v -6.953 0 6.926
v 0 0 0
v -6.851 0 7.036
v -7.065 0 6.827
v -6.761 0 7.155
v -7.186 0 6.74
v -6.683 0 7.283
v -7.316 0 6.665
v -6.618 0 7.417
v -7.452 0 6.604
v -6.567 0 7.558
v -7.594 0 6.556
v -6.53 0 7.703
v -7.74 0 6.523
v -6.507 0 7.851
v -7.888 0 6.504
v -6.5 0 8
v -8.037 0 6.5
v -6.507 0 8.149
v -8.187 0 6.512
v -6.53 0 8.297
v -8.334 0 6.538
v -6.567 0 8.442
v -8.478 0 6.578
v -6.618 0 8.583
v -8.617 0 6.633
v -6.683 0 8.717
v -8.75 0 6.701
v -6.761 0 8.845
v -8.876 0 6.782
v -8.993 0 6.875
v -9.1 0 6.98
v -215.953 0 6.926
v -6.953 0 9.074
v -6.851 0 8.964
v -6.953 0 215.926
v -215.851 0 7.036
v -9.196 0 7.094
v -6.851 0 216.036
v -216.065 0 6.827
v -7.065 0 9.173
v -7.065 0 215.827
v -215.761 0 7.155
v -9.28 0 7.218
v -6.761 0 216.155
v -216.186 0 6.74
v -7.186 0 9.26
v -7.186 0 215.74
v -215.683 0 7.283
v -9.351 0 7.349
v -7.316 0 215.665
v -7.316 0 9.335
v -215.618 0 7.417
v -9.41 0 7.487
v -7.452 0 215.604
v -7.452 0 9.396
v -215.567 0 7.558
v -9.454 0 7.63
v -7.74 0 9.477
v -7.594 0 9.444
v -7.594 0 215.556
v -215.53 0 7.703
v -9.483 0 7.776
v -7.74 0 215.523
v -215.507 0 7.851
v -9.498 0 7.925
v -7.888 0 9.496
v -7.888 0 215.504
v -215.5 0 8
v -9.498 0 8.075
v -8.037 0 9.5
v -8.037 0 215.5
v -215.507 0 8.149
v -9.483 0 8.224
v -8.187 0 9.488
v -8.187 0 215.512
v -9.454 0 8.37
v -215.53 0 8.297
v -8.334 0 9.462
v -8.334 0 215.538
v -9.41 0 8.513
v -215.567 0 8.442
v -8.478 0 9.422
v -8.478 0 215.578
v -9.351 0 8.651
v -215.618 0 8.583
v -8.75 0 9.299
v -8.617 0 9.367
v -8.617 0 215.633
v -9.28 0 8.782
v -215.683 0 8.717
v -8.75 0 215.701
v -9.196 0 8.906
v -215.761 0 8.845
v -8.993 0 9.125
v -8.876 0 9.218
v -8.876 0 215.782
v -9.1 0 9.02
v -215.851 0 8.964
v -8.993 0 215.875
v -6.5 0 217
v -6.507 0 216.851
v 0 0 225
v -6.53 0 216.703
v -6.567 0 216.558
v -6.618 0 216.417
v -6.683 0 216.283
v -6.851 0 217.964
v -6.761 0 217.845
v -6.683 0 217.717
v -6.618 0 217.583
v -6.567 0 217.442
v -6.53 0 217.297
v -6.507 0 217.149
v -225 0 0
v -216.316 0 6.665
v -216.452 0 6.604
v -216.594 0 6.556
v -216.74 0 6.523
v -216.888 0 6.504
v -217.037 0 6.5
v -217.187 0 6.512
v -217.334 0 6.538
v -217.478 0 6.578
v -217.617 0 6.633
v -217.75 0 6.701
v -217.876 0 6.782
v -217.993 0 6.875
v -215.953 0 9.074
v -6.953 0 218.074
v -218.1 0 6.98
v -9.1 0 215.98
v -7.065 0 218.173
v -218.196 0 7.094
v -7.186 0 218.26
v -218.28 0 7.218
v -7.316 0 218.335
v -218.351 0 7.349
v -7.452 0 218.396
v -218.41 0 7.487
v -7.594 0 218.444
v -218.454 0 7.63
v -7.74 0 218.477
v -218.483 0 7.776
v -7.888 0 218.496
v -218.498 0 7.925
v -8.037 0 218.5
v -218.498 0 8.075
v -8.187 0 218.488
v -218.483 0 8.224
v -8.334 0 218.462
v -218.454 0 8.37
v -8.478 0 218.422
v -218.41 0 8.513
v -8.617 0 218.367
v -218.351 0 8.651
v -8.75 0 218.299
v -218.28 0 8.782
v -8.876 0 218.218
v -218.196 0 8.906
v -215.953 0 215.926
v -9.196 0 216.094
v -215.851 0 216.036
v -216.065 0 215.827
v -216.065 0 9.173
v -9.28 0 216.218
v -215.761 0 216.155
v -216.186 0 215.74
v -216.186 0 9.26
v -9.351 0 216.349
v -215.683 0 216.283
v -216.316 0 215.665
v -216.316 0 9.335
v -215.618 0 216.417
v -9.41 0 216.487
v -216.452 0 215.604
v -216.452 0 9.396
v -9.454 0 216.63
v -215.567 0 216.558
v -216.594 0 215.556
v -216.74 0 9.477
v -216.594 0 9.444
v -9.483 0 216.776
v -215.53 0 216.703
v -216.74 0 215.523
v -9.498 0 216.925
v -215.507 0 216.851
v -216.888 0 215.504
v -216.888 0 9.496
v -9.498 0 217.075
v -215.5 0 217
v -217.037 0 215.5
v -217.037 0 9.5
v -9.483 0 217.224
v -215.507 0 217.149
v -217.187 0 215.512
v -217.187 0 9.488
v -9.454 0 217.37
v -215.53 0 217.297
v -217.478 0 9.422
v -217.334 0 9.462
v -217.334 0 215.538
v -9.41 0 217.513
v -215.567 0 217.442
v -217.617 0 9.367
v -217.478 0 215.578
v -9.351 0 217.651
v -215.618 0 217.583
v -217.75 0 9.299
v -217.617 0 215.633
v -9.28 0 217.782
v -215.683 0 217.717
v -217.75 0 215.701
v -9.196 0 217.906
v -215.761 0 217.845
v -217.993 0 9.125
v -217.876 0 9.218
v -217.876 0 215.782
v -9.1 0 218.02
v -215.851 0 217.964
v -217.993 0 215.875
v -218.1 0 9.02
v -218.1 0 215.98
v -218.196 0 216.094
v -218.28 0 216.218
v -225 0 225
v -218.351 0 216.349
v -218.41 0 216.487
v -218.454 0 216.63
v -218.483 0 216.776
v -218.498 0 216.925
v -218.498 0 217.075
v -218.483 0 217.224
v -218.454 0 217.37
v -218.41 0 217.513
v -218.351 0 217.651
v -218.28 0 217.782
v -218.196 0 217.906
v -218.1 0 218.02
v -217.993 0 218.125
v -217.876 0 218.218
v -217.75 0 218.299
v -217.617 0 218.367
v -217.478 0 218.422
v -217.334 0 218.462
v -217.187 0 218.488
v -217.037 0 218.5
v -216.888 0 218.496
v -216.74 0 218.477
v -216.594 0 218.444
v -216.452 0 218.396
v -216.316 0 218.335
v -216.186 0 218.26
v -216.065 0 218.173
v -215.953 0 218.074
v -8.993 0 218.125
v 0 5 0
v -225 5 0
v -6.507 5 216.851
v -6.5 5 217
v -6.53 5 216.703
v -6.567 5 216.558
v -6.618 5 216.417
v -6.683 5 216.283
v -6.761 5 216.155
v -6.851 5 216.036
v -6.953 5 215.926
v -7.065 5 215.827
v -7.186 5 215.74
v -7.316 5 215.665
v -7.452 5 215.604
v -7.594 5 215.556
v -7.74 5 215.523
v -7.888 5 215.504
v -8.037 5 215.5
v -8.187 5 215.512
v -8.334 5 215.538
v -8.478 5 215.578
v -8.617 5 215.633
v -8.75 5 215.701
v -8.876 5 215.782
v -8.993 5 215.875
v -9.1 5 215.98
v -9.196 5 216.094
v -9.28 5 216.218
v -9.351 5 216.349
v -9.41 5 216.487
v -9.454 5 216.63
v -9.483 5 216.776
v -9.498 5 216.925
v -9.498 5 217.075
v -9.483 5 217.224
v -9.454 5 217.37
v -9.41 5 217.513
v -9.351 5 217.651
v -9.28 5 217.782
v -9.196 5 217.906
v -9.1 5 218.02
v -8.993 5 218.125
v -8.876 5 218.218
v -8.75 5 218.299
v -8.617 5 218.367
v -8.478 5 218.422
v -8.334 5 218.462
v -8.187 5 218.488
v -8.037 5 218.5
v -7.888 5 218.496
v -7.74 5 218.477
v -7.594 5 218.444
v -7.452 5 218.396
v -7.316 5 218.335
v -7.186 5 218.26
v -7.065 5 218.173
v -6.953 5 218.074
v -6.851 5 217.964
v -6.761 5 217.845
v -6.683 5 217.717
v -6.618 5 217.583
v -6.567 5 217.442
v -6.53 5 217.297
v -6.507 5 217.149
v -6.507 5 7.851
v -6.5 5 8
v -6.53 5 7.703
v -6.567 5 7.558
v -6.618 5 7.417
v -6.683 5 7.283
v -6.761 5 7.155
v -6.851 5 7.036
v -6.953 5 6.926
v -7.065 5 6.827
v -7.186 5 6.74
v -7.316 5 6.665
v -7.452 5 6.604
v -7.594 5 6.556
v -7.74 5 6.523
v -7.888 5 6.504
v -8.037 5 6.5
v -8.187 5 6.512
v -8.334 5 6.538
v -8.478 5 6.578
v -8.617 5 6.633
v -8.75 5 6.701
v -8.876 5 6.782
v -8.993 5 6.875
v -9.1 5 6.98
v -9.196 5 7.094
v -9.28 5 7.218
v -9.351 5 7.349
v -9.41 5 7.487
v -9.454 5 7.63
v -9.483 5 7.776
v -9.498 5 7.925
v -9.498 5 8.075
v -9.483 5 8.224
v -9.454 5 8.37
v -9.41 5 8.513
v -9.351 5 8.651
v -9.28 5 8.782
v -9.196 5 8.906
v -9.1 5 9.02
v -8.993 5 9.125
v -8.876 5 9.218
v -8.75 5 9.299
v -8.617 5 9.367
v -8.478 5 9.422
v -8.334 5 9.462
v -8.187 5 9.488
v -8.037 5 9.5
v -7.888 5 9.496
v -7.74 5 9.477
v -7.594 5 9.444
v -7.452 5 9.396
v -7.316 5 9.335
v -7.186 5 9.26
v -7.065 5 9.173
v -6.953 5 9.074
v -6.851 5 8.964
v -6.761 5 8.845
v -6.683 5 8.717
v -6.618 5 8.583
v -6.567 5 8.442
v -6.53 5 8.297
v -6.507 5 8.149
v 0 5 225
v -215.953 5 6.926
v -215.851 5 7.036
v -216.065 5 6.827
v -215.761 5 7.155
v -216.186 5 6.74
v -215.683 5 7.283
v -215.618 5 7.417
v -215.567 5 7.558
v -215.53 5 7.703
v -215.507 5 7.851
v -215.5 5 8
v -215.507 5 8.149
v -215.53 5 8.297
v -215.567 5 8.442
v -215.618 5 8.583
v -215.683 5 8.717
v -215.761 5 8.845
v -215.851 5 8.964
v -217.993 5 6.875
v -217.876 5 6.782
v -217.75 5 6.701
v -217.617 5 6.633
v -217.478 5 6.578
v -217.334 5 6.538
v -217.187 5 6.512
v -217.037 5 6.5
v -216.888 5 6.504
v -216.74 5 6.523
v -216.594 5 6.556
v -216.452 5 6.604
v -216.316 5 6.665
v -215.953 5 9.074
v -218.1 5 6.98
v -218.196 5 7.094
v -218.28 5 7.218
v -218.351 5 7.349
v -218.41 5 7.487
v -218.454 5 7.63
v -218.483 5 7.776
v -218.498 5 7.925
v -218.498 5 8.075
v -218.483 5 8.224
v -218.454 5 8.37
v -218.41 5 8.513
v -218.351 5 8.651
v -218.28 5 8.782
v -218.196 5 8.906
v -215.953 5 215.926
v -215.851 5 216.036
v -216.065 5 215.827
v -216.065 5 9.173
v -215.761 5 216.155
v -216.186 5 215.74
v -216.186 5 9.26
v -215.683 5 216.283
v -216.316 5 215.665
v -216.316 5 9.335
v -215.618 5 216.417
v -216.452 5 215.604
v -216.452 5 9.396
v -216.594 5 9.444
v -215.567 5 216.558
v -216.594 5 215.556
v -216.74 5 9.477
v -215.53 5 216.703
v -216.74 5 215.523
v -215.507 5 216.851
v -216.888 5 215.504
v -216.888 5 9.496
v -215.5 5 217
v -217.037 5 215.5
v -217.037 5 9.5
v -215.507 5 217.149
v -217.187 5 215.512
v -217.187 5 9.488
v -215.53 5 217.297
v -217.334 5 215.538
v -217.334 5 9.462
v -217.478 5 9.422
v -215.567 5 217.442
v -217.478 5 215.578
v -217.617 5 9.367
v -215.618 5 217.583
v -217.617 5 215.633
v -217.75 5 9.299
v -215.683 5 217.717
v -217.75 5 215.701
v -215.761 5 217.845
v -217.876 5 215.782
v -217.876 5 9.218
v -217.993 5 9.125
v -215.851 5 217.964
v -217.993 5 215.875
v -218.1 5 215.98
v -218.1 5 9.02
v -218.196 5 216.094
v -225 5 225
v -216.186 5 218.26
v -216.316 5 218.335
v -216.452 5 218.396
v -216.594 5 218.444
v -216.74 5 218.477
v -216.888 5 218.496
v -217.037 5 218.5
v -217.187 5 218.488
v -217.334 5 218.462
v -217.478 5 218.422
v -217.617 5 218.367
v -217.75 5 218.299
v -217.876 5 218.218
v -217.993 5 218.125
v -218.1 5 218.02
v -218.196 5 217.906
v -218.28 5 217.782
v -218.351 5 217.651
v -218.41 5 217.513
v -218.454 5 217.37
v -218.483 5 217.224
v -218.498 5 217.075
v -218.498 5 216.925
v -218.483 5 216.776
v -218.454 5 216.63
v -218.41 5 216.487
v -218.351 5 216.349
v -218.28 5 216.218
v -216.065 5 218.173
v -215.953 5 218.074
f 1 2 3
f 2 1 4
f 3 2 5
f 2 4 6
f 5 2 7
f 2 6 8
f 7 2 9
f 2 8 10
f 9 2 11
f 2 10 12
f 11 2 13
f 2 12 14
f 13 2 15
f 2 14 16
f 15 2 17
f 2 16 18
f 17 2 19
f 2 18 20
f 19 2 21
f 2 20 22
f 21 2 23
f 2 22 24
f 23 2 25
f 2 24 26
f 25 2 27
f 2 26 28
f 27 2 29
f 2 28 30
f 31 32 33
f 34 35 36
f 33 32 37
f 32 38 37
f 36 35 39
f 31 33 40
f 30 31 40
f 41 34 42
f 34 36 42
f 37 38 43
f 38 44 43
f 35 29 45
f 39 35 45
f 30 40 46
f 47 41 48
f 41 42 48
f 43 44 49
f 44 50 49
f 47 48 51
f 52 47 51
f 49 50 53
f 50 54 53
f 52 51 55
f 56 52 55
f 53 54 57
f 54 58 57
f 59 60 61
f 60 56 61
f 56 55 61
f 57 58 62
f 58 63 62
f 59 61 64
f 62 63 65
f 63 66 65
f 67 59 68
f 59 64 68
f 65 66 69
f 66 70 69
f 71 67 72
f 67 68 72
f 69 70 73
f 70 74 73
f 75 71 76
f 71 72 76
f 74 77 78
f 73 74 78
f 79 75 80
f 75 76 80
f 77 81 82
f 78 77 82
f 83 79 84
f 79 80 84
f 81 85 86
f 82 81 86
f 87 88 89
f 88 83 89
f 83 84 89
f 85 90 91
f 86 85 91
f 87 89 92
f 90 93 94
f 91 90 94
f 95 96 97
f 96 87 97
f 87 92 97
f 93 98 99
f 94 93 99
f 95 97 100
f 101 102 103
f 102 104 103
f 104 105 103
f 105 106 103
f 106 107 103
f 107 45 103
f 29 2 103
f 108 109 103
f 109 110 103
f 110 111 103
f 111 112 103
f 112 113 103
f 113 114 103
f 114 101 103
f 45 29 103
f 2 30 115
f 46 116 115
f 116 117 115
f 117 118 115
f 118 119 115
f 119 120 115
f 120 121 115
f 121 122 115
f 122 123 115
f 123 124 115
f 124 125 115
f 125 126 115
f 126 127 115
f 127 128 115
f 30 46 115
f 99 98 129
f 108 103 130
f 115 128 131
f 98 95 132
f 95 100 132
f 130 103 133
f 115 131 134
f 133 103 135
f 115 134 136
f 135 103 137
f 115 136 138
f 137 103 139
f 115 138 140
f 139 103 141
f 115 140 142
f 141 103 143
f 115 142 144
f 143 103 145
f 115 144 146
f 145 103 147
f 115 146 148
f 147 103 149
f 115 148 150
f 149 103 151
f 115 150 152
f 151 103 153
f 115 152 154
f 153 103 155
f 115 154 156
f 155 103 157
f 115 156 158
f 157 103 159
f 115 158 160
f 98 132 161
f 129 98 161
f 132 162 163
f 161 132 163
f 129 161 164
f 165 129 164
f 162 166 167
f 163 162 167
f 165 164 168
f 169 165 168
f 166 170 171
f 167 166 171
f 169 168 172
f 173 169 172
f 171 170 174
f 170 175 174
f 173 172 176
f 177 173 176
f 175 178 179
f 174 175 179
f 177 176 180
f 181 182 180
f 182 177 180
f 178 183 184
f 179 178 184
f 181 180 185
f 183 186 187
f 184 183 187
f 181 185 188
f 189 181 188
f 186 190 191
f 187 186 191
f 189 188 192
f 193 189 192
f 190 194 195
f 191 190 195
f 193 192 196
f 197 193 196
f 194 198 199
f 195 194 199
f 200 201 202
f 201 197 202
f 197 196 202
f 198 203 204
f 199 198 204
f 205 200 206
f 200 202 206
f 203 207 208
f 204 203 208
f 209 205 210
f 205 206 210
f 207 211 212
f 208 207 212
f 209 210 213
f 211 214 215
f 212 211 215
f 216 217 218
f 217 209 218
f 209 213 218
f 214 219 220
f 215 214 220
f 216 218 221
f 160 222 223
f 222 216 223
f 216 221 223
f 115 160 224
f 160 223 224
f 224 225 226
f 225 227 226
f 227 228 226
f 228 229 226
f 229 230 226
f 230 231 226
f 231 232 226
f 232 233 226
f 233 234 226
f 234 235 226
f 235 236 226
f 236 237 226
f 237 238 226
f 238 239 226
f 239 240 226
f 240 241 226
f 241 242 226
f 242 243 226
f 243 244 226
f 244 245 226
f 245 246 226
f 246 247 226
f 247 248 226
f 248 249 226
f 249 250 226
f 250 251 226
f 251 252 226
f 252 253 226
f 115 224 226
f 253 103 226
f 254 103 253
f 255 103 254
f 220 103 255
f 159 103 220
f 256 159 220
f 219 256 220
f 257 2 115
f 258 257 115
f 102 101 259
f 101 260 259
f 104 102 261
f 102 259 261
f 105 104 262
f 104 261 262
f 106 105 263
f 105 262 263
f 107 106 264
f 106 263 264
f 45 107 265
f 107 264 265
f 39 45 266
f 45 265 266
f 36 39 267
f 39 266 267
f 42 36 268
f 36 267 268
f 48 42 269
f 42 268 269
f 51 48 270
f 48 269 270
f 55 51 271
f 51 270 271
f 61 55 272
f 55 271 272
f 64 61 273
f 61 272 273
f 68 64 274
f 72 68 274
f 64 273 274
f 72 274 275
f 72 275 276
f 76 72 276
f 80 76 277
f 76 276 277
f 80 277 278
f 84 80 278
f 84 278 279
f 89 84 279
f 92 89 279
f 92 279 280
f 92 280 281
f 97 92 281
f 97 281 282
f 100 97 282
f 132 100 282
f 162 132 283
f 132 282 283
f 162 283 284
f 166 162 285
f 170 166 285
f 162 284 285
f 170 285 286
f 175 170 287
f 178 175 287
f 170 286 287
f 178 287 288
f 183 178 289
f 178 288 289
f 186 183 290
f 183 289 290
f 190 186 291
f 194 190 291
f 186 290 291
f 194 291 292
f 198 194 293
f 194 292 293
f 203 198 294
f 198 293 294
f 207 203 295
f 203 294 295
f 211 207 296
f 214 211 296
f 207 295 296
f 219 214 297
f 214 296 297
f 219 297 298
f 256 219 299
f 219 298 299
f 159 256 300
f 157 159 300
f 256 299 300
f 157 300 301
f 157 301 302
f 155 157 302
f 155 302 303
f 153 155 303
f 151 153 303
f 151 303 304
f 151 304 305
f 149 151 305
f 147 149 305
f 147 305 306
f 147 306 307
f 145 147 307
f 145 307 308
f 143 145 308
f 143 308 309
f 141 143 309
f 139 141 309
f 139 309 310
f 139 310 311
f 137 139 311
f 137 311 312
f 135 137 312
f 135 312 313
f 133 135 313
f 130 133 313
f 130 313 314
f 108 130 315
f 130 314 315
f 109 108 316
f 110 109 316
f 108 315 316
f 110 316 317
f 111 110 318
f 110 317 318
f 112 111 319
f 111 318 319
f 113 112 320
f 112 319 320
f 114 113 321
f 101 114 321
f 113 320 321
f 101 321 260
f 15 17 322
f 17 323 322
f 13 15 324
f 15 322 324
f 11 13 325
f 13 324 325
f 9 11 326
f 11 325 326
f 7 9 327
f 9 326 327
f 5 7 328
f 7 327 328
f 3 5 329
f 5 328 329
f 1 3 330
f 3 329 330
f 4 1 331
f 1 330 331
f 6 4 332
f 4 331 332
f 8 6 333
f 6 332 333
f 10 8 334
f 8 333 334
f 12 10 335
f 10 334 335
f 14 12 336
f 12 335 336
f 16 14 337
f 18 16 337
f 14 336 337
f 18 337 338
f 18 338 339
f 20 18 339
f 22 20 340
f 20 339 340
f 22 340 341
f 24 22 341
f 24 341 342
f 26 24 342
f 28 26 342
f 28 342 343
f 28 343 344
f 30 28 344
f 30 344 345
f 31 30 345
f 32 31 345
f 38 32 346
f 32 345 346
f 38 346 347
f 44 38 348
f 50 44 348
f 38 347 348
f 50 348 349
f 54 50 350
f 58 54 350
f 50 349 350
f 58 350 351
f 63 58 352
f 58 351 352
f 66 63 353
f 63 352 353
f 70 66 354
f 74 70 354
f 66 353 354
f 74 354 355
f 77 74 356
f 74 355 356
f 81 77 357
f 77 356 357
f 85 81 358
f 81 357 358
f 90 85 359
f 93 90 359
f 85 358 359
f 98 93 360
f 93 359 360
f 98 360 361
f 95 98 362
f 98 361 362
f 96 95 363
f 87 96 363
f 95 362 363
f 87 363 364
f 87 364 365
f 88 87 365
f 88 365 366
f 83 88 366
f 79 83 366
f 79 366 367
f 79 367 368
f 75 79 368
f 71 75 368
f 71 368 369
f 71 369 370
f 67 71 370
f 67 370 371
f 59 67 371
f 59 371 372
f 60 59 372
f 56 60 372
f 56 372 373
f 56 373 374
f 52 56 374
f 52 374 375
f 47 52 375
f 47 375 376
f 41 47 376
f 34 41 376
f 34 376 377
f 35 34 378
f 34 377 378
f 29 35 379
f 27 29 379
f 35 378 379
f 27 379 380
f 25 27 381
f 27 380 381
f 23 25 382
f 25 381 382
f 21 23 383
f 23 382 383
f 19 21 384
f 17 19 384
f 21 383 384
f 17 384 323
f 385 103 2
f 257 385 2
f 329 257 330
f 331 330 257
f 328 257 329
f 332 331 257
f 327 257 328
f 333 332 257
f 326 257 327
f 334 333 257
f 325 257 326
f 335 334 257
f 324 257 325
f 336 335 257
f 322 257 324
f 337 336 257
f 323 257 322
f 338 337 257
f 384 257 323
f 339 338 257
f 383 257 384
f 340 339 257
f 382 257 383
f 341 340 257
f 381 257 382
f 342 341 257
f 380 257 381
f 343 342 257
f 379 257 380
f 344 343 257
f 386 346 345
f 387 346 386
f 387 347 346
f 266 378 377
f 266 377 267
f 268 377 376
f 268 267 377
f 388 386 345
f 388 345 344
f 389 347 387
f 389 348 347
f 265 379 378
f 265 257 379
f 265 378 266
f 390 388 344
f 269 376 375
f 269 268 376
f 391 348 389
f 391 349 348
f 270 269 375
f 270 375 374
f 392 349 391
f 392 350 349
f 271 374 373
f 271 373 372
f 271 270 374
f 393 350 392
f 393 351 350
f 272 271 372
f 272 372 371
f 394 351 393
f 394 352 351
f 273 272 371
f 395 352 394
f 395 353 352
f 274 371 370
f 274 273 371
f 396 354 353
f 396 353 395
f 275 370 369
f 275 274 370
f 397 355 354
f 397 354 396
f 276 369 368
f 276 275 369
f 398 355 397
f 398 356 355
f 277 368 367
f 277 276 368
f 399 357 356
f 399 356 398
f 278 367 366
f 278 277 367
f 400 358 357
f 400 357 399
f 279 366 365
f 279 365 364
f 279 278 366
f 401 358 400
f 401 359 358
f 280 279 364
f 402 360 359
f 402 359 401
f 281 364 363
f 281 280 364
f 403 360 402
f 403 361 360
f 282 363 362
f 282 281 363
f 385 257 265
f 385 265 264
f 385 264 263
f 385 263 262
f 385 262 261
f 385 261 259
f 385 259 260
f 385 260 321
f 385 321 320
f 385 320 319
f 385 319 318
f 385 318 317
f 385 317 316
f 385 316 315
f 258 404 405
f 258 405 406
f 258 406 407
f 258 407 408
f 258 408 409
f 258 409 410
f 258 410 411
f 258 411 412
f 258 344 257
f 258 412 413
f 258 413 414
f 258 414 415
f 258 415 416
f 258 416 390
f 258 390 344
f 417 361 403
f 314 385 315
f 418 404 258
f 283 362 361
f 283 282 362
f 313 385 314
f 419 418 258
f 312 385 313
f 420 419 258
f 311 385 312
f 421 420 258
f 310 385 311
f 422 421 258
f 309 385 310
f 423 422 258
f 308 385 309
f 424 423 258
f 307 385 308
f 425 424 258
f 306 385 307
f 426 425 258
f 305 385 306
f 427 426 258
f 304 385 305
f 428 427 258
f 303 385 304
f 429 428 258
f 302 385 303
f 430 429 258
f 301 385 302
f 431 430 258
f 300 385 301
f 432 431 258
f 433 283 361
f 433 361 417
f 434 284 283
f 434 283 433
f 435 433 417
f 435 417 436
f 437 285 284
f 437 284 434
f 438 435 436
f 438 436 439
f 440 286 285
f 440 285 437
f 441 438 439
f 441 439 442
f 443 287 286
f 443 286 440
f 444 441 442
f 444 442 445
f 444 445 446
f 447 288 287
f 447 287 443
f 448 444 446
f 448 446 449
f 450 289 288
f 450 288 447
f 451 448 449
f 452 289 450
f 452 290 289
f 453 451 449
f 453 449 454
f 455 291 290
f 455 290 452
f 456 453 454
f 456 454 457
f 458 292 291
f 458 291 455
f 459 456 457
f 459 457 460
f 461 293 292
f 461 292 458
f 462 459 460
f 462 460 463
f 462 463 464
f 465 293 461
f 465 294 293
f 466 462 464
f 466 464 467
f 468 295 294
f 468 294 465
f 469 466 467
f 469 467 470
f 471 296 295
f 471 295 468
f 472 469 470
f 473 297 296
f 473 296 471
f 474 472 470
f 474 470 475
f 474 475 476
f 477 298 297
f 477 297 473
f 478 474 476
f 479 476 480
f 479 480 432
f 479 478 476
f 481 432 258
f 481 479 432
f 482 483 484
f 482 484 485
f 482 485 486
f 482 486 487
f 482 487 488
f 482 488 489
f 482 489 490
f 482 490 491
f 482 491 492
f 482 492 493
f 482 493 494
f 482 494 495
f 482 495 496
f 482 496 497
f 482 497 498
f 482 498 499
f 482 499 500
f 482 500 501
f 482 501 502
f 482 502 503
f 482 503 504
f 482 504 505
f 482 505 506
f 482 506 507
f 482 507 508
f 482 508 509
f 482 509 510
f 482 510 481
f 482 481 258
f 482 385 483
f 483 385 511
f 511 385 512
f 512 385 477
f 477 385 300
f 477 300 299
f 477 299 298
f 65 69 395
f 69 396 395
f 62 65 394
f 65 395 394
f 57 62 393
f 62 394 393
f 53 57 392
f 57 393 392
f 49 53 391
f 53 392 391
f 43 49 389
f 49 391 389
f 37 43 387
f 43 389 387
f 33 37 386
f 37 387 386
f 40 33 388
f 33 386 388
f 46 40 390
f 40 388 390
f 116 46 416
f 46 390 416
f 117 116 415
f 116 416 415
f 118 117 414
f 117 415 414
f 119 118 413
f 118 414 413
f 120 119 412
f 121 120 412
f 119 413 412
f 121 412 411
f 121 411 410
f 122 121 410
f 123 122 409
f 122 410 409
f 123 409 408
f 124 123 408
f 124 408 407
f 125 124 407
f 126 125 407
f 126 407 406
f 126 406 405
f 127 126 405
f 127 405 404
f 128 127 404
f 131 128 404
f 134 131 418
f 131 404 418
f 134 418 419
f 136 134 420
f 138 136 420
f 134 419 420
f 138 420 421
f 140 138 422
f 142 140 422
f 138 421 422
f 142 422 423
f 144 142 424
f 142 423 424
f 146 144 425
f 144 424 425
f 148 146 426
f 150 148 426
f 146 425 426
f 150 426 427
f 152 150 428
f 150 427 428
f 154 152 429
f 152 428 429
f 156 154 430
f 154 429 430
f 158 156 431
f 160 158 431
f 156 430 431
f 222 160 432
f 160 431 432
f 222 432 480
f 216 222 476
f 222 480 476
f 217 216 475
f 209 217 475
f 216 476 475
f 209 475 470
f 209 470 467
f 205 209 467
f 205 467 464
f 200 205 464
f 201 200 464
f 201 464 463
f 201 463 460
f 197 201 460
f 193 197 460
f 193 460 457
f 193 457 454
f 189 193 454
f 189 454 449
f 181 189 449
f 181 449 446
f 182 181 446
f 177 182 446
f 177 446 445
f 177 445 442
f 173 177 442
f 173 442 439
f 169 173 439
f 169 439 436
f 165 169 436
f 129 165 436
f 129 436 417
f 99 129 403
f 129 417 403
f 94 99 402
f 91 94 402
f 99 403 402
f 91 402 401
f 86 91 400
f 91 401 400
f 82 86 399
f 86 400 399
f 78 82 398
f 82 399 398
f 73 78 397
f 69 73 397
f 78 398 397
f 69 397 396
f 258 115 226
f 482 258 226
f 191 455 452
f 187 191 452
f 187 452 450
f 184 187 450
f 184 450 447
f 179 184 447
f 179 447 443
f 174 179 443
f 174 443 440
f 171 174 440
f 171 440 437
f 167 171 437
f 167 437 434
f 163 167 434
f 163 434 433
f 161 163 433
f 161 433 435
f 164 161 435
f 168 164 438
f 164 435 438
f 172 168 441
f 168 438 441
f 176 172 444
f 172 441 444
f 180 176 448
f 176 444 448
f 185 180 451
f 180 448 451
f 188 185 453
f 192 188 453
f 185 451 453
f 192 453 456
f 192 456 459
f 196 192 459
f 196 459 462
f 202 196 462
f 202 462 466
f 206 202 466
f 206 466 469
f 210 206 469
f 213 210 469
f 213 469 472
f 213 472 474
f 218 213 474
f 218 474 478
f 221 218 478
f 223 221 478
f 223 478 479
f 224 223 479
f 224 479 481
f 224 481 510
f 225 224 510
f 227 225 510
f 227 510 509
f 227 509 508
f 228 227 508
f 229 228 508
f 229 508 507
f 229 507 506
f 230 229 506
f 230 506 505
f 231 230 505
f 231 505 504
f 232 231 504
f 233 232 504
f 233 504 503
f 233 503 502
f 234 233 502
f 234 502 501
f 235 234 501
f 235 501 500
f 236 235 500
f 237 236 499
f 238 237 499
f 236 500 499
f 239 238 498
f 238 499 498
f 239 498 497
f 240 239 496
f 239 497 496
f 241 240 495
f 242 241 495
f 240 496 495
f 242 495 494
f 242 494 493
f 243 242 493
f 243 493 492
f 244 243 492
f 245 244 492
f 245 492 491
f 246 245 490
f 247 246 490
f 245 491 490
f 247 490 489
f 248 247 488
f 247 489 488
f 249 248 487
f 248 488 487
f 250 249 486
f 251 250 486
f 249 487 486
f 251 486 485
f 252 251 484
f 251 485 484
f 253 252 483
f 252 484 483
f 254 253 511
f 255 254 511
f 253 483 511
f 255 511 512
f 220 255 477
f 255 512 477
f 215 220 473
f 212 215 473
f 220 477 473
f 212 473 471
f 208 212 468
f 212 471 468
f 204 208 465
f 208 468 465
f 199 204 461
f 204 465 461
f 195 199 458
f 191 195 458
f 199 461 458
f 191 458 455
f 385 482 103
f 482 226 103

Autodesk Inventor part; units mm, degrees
ref_plane "YZ Plane" through (0, 0, 0) normal (1, 0, 0) x (0, 1, 0)
ref_plane "XZ Plane" through (0, 0, 0) normal (0, 1, 0) x (-1, 0, 0)
ref_plane "XY Plane" through (0, 0, 0) normal (0, 0, 1) x (1, 0, 0)
sketch "Sketch1" plane through (0, 0, 0) normal (0, 1, 0) x (-1, 0, 0)
  line L0 (0, 0) -> (225, 0)
  line L1 (225, 0) -> (225, 225)
  line L2 (225, 225) -> (0, 225)
  line L3 (0, 225) -> (0, 0)
  dimension "d0" = 225
  dimension "d1" = 225
extrude "Extrusion1" add sketch "Sketch1" along normal blind 5
sketch "Sketch2" plane through (0, 5, 0) normal (0, 1, 0) x (1, 0, 0)
  line L0 (-217, -8) -> (-8, -8)
  line L1 (-8, -8) -> (-8, -217)
  line L2 (-8, -217) -> (-217, -217)
  line L3 (-217, -217) -> (-217, -8)
  circle A0 centre (-217, -8) radius 1.5
  circle A1 centre (-8, -8) radius 1.5
  circle A2 centre (-217, -217) radius 1.5
  circle A3 centre (-8, -217) radius 1.5
  dimension "d4" = 209
  dimension "d5" = 209
  dimension "d6" = 3
  dimension "d7" = 3
  dimension "d8" = 3
  dimension "d9" = 3
extrude "Extrusion2" cut sketch "Sketch2" against normal blind 5 contours L3 A0 L0 | L0 A0 L3 | A1 L1 L0 | L0 L1 A1 | A2 L2 L3 | L3 L2 A2 | A3 L2 L1 | L1 L2 A3
properties part number "Print_TopPlate" material "Birch"
